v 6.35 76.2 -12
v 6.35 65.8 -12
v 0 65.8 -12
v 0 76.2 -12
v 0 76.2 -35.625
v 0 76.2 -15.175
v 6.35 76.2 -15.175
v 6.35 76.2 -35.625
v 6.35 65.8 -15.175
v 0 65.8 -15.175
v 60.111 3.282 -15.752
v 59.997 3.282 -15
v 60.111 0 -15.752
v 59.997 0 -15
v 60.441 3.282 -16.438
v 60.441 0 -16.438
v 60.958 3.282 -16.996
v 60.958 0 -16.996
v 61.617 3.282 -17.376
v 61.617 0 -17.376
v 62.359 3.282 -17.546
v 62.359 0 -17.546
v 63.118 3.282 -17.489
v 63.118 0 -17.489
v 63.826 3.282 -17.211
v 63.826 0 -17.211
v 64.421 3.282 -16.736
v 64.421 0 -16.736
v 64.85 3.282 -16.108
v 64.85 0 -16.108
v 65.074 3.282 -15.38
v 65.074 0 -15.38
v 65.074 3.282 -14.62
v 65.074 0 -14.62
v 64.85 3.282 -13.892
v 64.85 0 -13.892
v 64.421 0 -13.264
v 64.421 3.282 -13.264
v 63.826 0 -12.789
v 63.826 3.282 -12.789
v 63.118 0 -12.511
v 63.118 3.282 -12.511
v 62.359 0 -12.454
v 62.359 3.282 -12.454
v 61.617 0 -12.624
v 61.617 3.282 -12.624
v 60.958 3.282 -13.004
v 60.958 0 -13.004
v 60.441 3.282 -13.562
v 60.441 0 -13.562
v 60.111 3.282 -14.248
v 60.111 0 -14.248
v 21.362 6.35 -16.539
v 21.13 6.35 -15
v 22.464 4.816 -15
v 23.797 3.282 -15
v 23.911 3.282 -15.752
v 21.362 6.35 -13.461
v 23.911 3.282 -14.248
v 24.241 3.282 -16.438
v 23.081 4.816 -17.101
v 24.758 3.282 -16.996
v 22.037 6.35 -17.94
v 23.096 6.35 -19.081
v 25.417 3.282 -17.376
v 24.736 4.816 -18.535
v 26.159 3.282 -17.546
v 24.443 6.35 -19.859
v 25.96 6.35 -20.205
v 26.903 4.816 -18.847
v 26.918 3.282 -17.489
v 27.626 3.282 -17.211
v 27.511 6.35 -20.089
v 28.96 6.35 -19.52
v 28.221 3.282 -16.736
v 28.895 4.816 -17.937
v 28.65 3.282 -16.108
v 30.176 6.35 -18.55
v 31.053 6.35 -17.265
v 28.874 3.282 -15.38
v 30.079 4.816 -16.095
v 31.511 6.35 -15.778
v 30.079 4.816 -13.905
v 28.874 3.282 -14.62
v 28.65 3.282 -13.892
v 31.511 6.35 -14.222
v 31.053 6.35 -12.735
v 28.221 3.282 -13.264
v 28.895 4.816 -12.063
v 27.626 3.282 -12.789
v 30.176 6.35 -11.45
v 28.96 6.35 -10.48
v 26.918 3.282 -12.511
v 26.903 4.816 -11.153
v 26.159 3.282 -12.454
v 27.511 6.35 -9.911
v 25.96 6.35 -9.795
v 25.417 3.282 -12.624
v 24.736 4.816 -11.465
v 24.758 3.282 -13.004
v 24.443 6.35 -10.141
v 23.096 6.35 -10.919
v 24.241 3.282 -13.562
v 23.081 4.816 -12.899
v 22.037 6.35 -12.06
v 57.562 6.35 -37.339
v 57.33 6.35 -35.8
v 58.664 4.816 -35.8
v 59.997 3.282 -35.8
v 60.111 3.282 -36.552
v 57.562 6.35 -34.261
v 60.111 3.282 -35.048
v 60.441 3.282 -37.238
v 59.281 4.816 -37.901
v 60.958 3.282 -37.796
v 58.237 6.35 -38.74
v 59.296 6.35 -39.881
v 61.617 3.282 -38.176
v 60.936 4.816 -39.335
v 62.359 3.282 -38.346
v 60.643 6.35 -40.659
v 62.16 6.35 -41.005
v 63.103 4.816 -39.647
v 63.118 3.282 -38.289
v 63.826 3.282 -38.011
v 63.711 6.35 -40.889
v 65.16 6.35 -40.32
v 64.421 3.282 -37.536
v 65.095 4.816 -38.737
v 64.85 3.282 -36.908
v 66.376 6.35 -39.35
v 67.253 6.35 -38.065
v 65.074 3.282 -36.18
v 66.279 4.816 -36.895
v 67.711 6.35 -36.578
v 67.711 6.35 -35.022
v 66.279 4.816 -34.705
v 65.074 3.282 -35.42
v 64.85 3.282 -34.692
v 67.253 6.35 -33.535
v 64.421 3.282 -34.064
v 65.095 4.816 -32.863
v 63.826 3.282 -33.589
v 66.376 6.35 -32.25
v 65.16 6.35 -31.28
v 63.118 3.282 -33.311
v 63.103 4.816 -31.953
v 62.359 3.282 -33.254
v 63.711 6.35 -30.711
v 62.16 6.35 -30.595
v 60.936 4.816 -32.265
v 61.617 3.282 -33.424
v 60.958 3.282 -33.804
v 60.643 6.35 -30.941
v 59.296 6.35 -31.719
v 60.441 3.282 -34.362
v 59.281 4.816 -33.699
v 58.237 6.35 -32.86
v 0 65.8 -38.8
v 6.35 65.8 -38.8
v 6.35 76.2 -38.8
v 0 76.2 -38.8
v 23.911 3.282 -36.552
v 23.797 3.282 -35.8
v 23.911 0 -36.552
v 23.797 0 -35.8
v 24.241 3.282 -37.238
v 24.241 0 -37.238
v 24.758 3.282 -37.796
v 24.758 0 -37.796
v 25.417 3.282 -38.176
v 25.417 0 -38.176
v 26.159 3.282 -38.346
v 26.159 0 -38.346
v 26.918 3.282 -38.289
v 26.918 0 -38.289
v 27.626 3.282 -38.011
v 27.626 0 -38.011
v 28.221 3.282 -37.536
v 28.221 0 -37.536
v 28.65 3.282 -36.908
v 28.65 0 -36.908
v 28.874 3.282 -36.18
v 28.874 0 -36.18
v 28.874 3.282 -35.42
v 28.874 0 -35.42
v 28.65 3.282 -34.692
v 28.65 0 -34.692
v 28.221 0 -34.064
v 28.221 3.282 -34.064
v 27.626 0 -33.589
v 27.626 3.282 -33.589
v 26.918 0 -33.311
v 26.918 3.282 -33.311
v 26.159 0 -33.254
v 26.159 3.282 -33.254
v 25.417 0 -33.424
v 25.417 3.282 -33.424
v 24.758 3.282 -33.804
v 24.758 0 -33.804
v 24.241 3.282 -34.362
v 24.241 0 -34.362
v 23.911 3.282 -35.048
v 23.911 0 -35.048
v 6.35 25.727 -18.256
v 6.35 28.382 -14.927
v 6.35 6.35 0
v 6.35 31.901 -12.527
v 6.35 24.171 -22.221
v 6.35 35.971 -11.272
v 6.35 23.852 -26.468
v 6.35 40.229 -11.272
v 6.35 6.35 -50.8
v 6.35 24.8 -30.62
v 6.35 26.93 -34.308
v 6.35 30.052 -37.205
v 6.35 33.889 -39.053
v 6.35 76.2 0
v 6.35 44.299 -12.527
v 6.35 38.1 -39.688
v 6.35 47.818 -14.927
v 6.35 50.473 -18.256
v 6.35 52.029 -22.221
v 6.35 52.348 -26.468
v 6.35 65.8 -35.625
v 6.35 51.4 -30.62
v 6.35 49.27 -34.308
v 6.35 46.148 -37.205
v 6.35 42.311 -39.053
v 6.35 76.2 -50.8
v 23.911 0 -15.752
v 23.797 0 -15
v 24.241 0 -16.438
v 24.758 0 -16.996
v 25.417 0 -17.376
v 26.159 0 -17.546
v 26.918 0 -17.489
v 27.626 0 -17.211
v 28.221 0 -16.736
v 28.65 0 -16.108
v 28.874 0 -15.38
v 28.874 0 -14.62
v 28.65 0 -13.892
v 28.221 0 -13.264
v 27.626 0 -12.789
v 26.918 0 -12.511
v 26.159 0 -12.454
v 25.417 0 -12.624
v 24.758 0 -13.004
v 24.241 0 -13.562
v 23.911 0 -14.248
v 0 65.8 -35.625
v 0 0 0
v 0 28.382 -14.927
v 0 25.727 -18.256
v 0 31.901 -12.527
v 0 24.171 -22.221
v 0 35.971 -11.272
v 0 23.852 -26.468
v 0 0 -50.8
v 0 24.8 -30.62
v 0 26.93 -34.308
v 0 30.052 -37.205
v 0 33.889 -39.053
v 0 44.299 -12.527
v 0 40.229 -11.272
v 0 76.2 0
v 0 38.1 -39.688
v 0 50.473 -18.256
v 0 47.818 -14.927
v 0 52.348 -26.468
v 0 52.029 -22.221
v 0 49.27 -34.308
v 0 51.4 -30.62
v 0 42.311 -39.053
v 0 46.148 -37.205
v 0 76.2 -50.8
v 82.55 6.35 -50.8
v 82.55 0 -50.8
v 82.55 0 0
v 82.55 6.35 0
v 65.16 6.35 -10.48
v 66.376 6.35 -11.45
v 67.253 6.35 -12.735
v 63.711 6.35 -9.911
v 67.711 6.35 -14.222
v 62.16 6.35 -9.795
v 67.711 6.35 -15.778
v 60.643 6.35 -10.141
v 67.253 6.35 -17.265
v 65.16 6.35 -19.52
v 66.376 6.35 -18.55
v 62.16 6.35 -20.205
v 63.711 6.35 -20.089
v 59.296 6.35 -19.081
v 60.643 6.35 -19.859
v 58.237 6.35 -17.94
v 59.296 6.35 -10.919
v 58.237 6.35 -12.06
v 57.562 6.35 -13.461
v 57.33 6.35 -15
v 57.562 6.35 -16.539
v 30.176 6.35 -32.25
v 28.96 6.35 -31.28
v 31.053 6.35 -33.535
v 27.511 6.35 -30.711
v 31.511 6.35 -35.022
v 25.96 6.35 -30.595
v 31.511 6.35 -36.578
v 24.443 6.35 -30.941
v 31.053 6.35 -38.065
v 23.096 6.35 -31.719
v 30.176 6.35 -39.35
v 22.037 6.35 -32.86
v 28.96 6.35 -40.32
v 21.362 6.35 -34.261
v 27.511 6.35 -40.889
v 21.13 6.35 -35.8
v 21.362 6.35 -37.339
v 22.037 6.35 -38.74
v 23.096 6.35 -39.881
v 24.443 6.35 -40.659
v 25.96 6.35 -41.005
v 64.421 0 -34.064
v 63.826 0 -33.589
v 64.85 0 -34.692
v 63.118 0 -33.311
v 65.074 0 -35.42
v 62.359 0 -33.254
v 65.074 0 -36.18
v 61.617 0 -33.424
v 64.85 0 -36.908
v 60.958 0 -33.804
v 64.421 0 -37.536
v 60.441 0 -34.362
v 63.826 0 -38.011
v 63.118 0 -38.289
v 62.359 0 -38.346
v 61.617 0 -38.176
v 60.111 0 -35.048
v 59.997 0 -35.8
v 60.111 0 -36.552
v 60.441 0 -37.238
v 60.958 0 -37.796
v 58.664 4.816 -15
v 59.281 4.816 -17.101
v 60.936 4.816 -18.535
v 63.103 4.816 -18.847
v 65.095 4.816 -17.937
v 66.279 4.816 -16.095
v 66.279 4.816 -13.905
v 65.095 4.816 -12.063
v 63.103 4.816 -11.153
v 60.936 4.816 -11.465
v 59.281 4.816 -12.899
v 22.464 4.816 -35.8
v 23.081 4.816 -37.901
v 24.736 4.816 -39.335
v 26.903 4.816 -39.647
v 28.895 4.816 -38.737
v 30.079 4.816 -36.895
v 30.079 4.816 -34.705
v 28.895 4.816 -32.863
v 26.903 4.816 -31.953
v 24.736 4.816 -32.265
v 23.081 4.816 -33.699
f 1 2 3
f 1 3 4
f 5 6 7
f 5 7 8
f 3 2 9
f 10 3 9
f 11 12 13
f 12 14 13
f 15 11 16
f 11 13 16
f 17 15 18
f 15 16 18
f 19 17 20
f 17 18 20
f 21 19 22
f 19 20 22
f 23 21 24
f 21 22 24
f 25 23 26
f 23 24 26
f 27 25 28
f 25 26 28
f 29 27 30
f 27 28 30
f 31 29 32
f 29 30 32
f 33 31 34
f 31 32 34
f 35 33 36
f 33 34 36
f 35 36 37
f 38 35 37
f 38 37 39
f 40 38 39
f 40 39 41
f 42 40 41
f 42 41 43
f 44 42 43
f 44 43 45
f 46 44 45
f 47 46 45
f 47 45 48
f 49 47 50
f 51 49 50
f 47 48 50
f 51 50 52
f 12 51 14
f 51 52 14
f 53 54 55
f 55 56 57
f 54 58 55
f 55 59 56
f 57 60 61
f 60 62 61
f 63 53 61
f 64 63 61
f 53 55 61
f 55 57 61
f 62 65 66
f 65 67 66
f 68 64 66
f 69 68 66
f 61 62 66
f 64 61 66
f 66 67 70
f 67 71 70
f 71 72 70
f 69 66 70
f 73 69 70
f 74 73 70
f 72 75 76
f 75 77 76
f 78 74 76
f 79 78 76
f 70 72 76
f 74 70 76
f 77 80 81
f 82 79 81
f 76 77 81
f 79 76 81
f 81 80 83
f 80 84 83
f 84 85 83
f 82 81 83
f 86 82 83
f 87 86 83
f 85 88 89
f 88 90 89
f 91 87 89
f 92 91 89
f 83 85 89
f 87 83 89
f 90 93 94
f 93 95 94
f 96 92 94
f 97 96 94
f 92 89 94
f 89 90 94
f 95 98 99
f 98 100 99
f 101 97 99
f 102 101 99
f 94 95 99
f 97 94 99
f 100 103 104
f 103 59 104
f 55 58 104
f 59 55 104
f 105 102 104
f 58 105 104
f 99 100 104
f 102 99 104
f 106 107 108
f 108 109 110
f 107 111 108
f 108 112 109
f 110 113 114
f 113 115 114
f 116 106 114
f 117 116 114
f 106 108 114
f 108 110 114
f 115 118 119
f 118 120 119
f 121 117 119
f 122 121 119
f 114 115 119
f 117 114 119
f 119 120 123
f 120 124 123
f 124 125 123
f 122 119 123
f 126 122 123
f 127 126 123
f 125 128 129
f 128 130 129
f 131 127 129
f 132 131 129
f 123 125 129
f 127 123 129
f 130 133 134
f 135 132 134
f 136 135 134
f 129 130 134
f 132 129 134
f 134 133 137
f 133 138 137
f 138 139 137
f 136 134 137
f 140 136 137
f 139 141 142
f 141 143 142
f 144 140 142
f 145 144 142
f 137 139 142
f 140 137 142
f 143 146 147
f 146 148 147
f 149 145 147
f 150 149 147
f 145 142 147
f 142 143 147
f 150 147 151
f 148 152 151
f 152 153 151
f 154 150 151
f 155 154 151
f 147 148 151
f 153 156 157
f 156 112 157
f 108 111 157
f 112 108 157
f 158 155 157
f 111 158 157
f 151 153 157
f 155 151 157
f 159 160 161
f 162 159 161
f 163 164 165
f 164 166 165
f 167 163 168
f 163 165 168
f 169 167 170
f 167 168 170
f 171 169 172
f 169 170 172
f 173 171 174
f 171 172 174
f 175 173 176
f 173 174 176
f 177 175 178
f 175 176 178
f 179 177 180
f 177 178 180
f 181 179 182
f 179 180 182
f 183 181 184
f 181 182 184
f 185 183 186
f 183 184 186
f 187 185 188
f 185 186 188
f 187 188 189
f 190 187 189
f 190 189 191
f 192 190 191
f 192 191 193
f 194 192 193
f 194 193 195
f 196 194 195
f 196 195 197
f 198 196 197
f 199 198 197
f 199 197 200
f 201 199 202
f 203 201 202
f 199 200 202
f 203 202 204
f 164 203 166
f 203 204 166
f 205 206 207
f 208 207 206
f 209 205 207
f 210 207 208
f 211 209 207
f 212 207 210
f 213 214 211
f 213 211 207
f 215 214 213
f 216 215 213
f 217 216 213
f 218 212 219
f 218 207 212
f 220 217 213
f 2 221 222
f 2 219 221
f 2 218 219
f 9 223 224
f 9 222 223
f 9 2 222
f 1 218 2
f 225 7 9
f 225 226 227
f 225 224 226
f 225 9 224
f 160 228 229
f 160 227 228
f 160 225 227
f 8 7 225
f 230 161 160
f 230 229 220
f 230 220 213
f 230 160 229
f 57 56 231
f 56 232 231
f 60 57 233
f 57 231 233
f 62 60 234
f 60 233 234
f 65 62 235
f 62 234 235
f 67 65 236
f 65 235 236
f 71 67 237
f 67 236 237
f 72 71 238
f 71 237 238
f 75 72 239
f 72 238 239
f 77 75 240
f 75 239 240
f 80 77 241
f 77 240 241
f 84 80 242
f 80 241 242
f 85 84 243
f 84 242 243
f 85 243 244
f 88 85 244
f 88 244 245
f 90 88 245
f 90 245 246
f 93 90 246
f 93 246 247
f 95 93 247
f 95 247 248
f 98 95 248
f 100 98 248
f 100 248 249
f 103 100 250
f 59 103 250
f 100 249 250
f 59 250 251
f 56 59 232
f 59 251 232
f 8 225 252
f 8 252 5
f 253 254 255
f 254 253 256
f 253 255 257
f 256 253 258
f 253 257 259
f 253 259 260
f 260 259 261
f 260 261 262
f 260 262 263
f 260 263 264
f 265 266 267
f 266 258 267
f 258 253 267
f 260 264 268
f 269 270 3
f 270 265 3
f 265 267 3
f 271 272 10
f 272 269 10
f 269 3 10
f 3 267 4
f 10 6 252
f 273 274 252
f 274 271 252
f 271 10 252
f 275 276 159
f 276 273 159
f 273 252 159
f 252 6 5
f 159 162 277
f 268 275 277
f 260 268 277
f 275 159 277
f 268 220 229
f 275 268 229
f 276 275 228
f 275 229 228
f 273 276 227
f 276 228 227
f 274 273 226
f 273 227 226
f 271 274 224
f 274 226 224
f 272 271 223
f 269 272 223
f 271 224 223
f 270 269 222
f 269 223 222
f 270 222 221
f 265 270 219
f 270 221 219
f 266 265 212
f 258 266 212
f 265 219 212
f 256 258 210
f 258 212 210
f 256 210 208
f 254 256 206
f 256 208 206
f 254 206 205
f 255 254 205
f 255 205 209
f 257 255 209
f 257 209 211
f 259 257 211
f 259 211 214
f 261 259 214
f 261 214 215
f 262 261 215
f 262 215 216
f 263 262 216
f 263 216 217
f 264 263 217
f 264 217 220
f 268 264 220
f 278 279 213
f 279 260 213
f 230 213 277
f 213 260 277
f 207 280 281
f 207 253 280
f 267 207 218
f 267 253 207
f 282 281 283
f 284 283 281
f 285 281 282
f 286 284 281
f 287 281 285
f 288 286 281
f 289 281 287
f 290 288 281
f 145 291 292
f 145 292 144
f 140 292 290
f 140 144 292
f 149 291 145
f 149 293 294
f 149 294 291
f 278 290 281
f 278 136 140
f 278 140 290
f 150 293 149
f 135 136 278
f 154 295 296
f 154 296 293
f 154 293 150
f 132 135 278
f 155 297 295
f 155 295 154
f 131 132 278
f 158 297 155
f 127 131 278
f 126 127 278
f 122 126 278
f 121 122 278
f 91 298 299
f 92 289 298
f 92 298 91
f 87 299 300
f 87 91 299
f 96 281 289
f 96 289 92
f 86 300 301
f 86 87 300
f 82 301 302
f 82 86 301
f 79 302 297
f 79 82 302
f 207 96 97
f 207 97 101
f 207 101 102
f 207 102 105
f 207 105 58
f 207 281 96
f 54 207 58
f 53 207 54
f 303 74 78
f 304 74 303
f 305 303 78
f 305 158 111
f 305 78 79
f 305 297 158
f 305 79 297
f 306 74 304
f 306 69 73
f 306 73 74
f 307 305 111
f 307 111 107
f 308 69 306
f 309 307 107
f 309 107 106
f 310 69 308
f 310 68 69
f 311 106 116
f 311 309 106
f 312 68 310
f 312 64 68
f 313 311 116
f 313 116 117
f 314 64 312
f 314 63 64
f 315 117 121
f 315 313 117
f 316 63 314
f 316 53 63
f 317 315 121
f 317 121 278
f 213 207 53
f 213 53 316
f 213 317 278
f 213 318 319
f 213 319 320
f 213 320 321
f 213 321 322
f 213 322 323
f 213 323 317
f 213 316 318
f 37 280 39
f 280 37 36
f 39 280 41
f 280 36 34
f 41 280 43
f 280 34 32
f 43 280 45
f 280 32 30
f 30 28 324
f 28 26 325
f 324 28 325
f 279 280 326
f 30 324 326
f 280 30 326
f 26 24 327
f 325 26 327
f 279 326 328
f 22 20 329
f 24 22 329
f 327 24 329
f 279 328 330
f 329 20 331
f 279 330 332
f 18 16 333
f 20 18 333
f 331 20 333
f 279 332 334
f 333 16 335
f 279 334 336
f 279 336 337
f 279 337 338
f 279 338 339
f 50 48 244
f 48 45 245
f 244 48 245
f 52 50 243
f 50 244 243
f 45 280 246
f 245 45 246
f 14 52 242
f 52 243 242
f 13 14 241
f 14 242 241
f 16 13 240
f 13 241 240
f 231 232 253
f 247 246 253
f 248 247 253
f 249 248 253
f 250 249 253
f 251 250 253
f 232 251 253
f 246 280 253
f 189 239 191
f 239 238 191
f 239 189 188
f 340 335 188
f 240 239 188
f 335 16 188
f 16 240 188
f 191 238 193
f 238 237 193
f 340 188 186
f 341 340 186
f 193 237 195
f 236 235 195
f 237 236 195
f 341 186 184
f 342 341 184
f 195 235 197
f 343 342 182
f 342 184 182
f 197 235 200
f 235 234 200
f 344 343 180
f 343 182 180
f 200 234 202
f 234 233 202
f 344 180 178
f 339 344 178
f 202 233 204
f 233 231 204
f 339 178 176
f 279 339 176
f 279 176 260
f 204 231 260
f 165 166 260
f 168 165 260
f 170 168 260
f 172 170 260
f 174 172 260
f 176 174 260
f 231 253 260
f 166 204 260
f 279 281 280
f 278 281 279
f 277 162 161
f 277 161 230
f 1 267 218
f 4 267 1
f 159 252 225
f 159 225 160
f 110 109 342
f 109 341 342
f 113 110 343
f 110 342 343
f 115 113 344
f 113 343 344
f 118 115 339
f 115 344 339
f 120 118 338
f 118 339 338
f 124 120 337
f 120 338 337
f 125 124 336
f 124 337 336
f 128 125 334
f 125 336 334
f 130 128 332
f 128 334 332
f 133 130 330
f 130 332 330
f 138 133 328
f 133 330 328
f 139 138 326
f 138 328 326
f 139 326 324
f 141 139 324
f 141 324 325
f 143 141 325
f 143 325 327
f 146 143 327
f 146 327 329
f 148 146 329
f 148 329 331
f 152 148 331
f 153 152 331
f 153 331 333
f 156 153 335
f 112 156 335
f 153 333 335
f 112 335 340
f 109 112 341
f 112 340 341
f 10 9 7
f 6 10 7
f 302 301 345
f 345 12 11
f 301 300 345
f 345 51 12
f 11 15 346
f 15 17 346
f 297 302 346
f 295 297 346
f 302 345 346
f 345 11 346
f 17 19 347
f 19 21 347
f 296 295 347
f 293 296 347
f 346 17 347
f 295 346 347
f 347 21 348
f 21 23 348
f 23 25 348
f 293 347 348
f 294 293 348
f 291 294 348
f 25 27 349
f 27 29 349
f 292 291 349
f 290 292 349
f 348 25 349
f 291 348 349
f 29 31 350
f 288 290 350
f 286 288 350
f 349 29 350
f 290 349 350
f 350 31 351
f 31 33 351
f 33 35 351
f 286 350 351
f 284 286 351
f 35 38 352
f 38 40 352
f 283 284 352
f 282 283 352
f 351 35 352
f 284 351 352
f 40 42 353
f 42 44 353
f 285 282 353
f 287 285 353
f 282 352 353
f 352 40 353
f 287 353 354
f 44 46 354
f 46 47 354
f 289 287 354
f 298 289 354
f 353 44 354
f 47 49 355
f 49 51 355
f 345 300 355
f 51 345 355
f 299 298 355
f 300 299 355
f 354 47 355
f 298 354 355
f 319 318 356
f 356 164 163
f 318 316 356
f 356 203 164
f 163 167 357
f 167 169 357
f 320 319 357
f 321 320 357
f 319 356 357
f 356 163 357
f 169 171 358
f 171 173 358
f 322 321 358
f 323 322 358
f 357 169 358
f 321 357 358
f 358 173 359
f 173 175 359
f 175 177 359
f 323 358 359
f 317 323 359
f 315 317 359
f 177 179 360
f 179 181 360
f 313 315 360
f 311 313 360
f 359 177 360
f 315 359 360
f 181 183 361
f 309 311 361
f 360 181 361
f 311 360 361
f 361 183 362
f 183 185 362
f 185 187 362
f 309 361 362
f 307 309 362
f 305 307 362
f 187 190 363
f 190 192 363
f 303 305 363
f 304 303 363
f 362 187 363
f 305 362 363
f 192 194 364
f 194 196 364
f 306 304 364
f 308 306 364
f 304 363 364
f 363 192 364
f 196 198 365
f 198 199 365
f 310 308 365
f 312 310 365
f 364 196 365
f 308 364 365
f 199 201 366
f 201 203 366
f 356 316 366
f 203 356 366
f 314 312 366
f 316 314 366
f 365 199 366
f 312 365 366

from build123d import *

# Parameters (mm, degrees)
SKETCH1_W                                          = 50.8
SKETCH1_H                                          = 76.2
BOSS_EXTRUDE1_DEPTH                                = 6.35
SKETCH2_W                                          = 50.8
SKETCH2_H                                          = 6.35
BOSS_EXTRUDE2_DEPTH                                = 76.2
SKETCH3_R                                          = 14.2875
CUT_EXTRUDE1_DEPTH                                 = 7.35
CSK_FOR_10_FLAT_HEAD_SOCKET_CAP_SCREW1_D           = 5.1054
CSK_FOR_10_FLAT_HEAD_SOCKET_CAP_SCREW1_CSINK_D     = 10.4394
CSK_FOR_10_FLAT_HEAD_SOCKET_CAP_SCREW1_CSINK_ANGLE = 82
SKETCH12_W                                         = 3.175
SKETCH12_H                                         = 10.4
CUT_EXTRUDE2_DEPTH                                 = 7.35


with BuildPart() as part:
    # Sketch1 → Boss-Extrude1 (new body)
    with BuildSketch(Plane(origin=(0, 0, 0), x_dir=(0, 0, -1), z_dir=(1, 0, 0))):
        with Locations((25.4, 38.1)):
            Rectangle(SKETCH1_W, SKETCH1_H)
    extrude(amount=BOSS_EXTRUDE1_DEPTH)

    # Sketch2 → Boss-Extrude2 (add)
    with BuildSketch(Plane(origin=(6.35, 0, 0), x_dir=(0, 0, -1), z_dir=(1, 0, 0))):
        with Locations((25.4, 3.175)):
            Rectangle(SKETCH2_W, SKETCH2_H)
    extrude(amount=BOSS_EXTRUDE2_DEPTH)

    # Sketch3 → Cut-Extrude1 (cut, through all)
    with BuildSketch(Plane(origin=(6.35, 0, 0), x_dir=(0, 0, -1), z_dir=(1, 0, 0))):
        with Locations((25.4, 38.1)):
            Circle(SKETCH3_R)
    extrude(amount=-CUT_EXTRUDE1_DEPTH, mode=Mode.SUBTRACT)

    # CSK for #10 Flat Head Socket Cap Screw1 (through all)
    with Locations(Plane(origin=(0, 6.35, 0), x_dir=(1, 0, 0), z_dir=(0, 1, 0))):
        with Locations((26.35, 35.8), (62.55, 35.8), (62.55, 15), (26.35, 15)):
            CounterSinkHole(CSK_FOR_10_FLAT_HEAD_SOCKET_CAP_SCREW1_D / 2, CSK_FOR_10_FLAT_HEAD_SOCKET_CAP_SCREW1_CSINK_D / 2, counter_sink_angle=CSK_FOR_10_FLAT_HEAD_SOCKET_CAP_SCREW1_CSINK_ANGLE)

    # Sketch12 → Cut-Extrude2 (cut, through all)
    with BuildSketch(Plane(origin=(6.35, 0, 0), x_dir=(0, 0, -1), z_dir=(1, 0, 0))):
        with Locations((37.2125, 71)):
            Rectangle(SKETCH12_W, SKETCH12_H)
        with Locations((13.5875, 71)):
            Rectangle(SKETCH12_W, SKETCH12_H)
    extrude(amount=-CUT_EXTRUDE2_DEPTH, mode=Mode.SUBTRACT)


solid = part.part
